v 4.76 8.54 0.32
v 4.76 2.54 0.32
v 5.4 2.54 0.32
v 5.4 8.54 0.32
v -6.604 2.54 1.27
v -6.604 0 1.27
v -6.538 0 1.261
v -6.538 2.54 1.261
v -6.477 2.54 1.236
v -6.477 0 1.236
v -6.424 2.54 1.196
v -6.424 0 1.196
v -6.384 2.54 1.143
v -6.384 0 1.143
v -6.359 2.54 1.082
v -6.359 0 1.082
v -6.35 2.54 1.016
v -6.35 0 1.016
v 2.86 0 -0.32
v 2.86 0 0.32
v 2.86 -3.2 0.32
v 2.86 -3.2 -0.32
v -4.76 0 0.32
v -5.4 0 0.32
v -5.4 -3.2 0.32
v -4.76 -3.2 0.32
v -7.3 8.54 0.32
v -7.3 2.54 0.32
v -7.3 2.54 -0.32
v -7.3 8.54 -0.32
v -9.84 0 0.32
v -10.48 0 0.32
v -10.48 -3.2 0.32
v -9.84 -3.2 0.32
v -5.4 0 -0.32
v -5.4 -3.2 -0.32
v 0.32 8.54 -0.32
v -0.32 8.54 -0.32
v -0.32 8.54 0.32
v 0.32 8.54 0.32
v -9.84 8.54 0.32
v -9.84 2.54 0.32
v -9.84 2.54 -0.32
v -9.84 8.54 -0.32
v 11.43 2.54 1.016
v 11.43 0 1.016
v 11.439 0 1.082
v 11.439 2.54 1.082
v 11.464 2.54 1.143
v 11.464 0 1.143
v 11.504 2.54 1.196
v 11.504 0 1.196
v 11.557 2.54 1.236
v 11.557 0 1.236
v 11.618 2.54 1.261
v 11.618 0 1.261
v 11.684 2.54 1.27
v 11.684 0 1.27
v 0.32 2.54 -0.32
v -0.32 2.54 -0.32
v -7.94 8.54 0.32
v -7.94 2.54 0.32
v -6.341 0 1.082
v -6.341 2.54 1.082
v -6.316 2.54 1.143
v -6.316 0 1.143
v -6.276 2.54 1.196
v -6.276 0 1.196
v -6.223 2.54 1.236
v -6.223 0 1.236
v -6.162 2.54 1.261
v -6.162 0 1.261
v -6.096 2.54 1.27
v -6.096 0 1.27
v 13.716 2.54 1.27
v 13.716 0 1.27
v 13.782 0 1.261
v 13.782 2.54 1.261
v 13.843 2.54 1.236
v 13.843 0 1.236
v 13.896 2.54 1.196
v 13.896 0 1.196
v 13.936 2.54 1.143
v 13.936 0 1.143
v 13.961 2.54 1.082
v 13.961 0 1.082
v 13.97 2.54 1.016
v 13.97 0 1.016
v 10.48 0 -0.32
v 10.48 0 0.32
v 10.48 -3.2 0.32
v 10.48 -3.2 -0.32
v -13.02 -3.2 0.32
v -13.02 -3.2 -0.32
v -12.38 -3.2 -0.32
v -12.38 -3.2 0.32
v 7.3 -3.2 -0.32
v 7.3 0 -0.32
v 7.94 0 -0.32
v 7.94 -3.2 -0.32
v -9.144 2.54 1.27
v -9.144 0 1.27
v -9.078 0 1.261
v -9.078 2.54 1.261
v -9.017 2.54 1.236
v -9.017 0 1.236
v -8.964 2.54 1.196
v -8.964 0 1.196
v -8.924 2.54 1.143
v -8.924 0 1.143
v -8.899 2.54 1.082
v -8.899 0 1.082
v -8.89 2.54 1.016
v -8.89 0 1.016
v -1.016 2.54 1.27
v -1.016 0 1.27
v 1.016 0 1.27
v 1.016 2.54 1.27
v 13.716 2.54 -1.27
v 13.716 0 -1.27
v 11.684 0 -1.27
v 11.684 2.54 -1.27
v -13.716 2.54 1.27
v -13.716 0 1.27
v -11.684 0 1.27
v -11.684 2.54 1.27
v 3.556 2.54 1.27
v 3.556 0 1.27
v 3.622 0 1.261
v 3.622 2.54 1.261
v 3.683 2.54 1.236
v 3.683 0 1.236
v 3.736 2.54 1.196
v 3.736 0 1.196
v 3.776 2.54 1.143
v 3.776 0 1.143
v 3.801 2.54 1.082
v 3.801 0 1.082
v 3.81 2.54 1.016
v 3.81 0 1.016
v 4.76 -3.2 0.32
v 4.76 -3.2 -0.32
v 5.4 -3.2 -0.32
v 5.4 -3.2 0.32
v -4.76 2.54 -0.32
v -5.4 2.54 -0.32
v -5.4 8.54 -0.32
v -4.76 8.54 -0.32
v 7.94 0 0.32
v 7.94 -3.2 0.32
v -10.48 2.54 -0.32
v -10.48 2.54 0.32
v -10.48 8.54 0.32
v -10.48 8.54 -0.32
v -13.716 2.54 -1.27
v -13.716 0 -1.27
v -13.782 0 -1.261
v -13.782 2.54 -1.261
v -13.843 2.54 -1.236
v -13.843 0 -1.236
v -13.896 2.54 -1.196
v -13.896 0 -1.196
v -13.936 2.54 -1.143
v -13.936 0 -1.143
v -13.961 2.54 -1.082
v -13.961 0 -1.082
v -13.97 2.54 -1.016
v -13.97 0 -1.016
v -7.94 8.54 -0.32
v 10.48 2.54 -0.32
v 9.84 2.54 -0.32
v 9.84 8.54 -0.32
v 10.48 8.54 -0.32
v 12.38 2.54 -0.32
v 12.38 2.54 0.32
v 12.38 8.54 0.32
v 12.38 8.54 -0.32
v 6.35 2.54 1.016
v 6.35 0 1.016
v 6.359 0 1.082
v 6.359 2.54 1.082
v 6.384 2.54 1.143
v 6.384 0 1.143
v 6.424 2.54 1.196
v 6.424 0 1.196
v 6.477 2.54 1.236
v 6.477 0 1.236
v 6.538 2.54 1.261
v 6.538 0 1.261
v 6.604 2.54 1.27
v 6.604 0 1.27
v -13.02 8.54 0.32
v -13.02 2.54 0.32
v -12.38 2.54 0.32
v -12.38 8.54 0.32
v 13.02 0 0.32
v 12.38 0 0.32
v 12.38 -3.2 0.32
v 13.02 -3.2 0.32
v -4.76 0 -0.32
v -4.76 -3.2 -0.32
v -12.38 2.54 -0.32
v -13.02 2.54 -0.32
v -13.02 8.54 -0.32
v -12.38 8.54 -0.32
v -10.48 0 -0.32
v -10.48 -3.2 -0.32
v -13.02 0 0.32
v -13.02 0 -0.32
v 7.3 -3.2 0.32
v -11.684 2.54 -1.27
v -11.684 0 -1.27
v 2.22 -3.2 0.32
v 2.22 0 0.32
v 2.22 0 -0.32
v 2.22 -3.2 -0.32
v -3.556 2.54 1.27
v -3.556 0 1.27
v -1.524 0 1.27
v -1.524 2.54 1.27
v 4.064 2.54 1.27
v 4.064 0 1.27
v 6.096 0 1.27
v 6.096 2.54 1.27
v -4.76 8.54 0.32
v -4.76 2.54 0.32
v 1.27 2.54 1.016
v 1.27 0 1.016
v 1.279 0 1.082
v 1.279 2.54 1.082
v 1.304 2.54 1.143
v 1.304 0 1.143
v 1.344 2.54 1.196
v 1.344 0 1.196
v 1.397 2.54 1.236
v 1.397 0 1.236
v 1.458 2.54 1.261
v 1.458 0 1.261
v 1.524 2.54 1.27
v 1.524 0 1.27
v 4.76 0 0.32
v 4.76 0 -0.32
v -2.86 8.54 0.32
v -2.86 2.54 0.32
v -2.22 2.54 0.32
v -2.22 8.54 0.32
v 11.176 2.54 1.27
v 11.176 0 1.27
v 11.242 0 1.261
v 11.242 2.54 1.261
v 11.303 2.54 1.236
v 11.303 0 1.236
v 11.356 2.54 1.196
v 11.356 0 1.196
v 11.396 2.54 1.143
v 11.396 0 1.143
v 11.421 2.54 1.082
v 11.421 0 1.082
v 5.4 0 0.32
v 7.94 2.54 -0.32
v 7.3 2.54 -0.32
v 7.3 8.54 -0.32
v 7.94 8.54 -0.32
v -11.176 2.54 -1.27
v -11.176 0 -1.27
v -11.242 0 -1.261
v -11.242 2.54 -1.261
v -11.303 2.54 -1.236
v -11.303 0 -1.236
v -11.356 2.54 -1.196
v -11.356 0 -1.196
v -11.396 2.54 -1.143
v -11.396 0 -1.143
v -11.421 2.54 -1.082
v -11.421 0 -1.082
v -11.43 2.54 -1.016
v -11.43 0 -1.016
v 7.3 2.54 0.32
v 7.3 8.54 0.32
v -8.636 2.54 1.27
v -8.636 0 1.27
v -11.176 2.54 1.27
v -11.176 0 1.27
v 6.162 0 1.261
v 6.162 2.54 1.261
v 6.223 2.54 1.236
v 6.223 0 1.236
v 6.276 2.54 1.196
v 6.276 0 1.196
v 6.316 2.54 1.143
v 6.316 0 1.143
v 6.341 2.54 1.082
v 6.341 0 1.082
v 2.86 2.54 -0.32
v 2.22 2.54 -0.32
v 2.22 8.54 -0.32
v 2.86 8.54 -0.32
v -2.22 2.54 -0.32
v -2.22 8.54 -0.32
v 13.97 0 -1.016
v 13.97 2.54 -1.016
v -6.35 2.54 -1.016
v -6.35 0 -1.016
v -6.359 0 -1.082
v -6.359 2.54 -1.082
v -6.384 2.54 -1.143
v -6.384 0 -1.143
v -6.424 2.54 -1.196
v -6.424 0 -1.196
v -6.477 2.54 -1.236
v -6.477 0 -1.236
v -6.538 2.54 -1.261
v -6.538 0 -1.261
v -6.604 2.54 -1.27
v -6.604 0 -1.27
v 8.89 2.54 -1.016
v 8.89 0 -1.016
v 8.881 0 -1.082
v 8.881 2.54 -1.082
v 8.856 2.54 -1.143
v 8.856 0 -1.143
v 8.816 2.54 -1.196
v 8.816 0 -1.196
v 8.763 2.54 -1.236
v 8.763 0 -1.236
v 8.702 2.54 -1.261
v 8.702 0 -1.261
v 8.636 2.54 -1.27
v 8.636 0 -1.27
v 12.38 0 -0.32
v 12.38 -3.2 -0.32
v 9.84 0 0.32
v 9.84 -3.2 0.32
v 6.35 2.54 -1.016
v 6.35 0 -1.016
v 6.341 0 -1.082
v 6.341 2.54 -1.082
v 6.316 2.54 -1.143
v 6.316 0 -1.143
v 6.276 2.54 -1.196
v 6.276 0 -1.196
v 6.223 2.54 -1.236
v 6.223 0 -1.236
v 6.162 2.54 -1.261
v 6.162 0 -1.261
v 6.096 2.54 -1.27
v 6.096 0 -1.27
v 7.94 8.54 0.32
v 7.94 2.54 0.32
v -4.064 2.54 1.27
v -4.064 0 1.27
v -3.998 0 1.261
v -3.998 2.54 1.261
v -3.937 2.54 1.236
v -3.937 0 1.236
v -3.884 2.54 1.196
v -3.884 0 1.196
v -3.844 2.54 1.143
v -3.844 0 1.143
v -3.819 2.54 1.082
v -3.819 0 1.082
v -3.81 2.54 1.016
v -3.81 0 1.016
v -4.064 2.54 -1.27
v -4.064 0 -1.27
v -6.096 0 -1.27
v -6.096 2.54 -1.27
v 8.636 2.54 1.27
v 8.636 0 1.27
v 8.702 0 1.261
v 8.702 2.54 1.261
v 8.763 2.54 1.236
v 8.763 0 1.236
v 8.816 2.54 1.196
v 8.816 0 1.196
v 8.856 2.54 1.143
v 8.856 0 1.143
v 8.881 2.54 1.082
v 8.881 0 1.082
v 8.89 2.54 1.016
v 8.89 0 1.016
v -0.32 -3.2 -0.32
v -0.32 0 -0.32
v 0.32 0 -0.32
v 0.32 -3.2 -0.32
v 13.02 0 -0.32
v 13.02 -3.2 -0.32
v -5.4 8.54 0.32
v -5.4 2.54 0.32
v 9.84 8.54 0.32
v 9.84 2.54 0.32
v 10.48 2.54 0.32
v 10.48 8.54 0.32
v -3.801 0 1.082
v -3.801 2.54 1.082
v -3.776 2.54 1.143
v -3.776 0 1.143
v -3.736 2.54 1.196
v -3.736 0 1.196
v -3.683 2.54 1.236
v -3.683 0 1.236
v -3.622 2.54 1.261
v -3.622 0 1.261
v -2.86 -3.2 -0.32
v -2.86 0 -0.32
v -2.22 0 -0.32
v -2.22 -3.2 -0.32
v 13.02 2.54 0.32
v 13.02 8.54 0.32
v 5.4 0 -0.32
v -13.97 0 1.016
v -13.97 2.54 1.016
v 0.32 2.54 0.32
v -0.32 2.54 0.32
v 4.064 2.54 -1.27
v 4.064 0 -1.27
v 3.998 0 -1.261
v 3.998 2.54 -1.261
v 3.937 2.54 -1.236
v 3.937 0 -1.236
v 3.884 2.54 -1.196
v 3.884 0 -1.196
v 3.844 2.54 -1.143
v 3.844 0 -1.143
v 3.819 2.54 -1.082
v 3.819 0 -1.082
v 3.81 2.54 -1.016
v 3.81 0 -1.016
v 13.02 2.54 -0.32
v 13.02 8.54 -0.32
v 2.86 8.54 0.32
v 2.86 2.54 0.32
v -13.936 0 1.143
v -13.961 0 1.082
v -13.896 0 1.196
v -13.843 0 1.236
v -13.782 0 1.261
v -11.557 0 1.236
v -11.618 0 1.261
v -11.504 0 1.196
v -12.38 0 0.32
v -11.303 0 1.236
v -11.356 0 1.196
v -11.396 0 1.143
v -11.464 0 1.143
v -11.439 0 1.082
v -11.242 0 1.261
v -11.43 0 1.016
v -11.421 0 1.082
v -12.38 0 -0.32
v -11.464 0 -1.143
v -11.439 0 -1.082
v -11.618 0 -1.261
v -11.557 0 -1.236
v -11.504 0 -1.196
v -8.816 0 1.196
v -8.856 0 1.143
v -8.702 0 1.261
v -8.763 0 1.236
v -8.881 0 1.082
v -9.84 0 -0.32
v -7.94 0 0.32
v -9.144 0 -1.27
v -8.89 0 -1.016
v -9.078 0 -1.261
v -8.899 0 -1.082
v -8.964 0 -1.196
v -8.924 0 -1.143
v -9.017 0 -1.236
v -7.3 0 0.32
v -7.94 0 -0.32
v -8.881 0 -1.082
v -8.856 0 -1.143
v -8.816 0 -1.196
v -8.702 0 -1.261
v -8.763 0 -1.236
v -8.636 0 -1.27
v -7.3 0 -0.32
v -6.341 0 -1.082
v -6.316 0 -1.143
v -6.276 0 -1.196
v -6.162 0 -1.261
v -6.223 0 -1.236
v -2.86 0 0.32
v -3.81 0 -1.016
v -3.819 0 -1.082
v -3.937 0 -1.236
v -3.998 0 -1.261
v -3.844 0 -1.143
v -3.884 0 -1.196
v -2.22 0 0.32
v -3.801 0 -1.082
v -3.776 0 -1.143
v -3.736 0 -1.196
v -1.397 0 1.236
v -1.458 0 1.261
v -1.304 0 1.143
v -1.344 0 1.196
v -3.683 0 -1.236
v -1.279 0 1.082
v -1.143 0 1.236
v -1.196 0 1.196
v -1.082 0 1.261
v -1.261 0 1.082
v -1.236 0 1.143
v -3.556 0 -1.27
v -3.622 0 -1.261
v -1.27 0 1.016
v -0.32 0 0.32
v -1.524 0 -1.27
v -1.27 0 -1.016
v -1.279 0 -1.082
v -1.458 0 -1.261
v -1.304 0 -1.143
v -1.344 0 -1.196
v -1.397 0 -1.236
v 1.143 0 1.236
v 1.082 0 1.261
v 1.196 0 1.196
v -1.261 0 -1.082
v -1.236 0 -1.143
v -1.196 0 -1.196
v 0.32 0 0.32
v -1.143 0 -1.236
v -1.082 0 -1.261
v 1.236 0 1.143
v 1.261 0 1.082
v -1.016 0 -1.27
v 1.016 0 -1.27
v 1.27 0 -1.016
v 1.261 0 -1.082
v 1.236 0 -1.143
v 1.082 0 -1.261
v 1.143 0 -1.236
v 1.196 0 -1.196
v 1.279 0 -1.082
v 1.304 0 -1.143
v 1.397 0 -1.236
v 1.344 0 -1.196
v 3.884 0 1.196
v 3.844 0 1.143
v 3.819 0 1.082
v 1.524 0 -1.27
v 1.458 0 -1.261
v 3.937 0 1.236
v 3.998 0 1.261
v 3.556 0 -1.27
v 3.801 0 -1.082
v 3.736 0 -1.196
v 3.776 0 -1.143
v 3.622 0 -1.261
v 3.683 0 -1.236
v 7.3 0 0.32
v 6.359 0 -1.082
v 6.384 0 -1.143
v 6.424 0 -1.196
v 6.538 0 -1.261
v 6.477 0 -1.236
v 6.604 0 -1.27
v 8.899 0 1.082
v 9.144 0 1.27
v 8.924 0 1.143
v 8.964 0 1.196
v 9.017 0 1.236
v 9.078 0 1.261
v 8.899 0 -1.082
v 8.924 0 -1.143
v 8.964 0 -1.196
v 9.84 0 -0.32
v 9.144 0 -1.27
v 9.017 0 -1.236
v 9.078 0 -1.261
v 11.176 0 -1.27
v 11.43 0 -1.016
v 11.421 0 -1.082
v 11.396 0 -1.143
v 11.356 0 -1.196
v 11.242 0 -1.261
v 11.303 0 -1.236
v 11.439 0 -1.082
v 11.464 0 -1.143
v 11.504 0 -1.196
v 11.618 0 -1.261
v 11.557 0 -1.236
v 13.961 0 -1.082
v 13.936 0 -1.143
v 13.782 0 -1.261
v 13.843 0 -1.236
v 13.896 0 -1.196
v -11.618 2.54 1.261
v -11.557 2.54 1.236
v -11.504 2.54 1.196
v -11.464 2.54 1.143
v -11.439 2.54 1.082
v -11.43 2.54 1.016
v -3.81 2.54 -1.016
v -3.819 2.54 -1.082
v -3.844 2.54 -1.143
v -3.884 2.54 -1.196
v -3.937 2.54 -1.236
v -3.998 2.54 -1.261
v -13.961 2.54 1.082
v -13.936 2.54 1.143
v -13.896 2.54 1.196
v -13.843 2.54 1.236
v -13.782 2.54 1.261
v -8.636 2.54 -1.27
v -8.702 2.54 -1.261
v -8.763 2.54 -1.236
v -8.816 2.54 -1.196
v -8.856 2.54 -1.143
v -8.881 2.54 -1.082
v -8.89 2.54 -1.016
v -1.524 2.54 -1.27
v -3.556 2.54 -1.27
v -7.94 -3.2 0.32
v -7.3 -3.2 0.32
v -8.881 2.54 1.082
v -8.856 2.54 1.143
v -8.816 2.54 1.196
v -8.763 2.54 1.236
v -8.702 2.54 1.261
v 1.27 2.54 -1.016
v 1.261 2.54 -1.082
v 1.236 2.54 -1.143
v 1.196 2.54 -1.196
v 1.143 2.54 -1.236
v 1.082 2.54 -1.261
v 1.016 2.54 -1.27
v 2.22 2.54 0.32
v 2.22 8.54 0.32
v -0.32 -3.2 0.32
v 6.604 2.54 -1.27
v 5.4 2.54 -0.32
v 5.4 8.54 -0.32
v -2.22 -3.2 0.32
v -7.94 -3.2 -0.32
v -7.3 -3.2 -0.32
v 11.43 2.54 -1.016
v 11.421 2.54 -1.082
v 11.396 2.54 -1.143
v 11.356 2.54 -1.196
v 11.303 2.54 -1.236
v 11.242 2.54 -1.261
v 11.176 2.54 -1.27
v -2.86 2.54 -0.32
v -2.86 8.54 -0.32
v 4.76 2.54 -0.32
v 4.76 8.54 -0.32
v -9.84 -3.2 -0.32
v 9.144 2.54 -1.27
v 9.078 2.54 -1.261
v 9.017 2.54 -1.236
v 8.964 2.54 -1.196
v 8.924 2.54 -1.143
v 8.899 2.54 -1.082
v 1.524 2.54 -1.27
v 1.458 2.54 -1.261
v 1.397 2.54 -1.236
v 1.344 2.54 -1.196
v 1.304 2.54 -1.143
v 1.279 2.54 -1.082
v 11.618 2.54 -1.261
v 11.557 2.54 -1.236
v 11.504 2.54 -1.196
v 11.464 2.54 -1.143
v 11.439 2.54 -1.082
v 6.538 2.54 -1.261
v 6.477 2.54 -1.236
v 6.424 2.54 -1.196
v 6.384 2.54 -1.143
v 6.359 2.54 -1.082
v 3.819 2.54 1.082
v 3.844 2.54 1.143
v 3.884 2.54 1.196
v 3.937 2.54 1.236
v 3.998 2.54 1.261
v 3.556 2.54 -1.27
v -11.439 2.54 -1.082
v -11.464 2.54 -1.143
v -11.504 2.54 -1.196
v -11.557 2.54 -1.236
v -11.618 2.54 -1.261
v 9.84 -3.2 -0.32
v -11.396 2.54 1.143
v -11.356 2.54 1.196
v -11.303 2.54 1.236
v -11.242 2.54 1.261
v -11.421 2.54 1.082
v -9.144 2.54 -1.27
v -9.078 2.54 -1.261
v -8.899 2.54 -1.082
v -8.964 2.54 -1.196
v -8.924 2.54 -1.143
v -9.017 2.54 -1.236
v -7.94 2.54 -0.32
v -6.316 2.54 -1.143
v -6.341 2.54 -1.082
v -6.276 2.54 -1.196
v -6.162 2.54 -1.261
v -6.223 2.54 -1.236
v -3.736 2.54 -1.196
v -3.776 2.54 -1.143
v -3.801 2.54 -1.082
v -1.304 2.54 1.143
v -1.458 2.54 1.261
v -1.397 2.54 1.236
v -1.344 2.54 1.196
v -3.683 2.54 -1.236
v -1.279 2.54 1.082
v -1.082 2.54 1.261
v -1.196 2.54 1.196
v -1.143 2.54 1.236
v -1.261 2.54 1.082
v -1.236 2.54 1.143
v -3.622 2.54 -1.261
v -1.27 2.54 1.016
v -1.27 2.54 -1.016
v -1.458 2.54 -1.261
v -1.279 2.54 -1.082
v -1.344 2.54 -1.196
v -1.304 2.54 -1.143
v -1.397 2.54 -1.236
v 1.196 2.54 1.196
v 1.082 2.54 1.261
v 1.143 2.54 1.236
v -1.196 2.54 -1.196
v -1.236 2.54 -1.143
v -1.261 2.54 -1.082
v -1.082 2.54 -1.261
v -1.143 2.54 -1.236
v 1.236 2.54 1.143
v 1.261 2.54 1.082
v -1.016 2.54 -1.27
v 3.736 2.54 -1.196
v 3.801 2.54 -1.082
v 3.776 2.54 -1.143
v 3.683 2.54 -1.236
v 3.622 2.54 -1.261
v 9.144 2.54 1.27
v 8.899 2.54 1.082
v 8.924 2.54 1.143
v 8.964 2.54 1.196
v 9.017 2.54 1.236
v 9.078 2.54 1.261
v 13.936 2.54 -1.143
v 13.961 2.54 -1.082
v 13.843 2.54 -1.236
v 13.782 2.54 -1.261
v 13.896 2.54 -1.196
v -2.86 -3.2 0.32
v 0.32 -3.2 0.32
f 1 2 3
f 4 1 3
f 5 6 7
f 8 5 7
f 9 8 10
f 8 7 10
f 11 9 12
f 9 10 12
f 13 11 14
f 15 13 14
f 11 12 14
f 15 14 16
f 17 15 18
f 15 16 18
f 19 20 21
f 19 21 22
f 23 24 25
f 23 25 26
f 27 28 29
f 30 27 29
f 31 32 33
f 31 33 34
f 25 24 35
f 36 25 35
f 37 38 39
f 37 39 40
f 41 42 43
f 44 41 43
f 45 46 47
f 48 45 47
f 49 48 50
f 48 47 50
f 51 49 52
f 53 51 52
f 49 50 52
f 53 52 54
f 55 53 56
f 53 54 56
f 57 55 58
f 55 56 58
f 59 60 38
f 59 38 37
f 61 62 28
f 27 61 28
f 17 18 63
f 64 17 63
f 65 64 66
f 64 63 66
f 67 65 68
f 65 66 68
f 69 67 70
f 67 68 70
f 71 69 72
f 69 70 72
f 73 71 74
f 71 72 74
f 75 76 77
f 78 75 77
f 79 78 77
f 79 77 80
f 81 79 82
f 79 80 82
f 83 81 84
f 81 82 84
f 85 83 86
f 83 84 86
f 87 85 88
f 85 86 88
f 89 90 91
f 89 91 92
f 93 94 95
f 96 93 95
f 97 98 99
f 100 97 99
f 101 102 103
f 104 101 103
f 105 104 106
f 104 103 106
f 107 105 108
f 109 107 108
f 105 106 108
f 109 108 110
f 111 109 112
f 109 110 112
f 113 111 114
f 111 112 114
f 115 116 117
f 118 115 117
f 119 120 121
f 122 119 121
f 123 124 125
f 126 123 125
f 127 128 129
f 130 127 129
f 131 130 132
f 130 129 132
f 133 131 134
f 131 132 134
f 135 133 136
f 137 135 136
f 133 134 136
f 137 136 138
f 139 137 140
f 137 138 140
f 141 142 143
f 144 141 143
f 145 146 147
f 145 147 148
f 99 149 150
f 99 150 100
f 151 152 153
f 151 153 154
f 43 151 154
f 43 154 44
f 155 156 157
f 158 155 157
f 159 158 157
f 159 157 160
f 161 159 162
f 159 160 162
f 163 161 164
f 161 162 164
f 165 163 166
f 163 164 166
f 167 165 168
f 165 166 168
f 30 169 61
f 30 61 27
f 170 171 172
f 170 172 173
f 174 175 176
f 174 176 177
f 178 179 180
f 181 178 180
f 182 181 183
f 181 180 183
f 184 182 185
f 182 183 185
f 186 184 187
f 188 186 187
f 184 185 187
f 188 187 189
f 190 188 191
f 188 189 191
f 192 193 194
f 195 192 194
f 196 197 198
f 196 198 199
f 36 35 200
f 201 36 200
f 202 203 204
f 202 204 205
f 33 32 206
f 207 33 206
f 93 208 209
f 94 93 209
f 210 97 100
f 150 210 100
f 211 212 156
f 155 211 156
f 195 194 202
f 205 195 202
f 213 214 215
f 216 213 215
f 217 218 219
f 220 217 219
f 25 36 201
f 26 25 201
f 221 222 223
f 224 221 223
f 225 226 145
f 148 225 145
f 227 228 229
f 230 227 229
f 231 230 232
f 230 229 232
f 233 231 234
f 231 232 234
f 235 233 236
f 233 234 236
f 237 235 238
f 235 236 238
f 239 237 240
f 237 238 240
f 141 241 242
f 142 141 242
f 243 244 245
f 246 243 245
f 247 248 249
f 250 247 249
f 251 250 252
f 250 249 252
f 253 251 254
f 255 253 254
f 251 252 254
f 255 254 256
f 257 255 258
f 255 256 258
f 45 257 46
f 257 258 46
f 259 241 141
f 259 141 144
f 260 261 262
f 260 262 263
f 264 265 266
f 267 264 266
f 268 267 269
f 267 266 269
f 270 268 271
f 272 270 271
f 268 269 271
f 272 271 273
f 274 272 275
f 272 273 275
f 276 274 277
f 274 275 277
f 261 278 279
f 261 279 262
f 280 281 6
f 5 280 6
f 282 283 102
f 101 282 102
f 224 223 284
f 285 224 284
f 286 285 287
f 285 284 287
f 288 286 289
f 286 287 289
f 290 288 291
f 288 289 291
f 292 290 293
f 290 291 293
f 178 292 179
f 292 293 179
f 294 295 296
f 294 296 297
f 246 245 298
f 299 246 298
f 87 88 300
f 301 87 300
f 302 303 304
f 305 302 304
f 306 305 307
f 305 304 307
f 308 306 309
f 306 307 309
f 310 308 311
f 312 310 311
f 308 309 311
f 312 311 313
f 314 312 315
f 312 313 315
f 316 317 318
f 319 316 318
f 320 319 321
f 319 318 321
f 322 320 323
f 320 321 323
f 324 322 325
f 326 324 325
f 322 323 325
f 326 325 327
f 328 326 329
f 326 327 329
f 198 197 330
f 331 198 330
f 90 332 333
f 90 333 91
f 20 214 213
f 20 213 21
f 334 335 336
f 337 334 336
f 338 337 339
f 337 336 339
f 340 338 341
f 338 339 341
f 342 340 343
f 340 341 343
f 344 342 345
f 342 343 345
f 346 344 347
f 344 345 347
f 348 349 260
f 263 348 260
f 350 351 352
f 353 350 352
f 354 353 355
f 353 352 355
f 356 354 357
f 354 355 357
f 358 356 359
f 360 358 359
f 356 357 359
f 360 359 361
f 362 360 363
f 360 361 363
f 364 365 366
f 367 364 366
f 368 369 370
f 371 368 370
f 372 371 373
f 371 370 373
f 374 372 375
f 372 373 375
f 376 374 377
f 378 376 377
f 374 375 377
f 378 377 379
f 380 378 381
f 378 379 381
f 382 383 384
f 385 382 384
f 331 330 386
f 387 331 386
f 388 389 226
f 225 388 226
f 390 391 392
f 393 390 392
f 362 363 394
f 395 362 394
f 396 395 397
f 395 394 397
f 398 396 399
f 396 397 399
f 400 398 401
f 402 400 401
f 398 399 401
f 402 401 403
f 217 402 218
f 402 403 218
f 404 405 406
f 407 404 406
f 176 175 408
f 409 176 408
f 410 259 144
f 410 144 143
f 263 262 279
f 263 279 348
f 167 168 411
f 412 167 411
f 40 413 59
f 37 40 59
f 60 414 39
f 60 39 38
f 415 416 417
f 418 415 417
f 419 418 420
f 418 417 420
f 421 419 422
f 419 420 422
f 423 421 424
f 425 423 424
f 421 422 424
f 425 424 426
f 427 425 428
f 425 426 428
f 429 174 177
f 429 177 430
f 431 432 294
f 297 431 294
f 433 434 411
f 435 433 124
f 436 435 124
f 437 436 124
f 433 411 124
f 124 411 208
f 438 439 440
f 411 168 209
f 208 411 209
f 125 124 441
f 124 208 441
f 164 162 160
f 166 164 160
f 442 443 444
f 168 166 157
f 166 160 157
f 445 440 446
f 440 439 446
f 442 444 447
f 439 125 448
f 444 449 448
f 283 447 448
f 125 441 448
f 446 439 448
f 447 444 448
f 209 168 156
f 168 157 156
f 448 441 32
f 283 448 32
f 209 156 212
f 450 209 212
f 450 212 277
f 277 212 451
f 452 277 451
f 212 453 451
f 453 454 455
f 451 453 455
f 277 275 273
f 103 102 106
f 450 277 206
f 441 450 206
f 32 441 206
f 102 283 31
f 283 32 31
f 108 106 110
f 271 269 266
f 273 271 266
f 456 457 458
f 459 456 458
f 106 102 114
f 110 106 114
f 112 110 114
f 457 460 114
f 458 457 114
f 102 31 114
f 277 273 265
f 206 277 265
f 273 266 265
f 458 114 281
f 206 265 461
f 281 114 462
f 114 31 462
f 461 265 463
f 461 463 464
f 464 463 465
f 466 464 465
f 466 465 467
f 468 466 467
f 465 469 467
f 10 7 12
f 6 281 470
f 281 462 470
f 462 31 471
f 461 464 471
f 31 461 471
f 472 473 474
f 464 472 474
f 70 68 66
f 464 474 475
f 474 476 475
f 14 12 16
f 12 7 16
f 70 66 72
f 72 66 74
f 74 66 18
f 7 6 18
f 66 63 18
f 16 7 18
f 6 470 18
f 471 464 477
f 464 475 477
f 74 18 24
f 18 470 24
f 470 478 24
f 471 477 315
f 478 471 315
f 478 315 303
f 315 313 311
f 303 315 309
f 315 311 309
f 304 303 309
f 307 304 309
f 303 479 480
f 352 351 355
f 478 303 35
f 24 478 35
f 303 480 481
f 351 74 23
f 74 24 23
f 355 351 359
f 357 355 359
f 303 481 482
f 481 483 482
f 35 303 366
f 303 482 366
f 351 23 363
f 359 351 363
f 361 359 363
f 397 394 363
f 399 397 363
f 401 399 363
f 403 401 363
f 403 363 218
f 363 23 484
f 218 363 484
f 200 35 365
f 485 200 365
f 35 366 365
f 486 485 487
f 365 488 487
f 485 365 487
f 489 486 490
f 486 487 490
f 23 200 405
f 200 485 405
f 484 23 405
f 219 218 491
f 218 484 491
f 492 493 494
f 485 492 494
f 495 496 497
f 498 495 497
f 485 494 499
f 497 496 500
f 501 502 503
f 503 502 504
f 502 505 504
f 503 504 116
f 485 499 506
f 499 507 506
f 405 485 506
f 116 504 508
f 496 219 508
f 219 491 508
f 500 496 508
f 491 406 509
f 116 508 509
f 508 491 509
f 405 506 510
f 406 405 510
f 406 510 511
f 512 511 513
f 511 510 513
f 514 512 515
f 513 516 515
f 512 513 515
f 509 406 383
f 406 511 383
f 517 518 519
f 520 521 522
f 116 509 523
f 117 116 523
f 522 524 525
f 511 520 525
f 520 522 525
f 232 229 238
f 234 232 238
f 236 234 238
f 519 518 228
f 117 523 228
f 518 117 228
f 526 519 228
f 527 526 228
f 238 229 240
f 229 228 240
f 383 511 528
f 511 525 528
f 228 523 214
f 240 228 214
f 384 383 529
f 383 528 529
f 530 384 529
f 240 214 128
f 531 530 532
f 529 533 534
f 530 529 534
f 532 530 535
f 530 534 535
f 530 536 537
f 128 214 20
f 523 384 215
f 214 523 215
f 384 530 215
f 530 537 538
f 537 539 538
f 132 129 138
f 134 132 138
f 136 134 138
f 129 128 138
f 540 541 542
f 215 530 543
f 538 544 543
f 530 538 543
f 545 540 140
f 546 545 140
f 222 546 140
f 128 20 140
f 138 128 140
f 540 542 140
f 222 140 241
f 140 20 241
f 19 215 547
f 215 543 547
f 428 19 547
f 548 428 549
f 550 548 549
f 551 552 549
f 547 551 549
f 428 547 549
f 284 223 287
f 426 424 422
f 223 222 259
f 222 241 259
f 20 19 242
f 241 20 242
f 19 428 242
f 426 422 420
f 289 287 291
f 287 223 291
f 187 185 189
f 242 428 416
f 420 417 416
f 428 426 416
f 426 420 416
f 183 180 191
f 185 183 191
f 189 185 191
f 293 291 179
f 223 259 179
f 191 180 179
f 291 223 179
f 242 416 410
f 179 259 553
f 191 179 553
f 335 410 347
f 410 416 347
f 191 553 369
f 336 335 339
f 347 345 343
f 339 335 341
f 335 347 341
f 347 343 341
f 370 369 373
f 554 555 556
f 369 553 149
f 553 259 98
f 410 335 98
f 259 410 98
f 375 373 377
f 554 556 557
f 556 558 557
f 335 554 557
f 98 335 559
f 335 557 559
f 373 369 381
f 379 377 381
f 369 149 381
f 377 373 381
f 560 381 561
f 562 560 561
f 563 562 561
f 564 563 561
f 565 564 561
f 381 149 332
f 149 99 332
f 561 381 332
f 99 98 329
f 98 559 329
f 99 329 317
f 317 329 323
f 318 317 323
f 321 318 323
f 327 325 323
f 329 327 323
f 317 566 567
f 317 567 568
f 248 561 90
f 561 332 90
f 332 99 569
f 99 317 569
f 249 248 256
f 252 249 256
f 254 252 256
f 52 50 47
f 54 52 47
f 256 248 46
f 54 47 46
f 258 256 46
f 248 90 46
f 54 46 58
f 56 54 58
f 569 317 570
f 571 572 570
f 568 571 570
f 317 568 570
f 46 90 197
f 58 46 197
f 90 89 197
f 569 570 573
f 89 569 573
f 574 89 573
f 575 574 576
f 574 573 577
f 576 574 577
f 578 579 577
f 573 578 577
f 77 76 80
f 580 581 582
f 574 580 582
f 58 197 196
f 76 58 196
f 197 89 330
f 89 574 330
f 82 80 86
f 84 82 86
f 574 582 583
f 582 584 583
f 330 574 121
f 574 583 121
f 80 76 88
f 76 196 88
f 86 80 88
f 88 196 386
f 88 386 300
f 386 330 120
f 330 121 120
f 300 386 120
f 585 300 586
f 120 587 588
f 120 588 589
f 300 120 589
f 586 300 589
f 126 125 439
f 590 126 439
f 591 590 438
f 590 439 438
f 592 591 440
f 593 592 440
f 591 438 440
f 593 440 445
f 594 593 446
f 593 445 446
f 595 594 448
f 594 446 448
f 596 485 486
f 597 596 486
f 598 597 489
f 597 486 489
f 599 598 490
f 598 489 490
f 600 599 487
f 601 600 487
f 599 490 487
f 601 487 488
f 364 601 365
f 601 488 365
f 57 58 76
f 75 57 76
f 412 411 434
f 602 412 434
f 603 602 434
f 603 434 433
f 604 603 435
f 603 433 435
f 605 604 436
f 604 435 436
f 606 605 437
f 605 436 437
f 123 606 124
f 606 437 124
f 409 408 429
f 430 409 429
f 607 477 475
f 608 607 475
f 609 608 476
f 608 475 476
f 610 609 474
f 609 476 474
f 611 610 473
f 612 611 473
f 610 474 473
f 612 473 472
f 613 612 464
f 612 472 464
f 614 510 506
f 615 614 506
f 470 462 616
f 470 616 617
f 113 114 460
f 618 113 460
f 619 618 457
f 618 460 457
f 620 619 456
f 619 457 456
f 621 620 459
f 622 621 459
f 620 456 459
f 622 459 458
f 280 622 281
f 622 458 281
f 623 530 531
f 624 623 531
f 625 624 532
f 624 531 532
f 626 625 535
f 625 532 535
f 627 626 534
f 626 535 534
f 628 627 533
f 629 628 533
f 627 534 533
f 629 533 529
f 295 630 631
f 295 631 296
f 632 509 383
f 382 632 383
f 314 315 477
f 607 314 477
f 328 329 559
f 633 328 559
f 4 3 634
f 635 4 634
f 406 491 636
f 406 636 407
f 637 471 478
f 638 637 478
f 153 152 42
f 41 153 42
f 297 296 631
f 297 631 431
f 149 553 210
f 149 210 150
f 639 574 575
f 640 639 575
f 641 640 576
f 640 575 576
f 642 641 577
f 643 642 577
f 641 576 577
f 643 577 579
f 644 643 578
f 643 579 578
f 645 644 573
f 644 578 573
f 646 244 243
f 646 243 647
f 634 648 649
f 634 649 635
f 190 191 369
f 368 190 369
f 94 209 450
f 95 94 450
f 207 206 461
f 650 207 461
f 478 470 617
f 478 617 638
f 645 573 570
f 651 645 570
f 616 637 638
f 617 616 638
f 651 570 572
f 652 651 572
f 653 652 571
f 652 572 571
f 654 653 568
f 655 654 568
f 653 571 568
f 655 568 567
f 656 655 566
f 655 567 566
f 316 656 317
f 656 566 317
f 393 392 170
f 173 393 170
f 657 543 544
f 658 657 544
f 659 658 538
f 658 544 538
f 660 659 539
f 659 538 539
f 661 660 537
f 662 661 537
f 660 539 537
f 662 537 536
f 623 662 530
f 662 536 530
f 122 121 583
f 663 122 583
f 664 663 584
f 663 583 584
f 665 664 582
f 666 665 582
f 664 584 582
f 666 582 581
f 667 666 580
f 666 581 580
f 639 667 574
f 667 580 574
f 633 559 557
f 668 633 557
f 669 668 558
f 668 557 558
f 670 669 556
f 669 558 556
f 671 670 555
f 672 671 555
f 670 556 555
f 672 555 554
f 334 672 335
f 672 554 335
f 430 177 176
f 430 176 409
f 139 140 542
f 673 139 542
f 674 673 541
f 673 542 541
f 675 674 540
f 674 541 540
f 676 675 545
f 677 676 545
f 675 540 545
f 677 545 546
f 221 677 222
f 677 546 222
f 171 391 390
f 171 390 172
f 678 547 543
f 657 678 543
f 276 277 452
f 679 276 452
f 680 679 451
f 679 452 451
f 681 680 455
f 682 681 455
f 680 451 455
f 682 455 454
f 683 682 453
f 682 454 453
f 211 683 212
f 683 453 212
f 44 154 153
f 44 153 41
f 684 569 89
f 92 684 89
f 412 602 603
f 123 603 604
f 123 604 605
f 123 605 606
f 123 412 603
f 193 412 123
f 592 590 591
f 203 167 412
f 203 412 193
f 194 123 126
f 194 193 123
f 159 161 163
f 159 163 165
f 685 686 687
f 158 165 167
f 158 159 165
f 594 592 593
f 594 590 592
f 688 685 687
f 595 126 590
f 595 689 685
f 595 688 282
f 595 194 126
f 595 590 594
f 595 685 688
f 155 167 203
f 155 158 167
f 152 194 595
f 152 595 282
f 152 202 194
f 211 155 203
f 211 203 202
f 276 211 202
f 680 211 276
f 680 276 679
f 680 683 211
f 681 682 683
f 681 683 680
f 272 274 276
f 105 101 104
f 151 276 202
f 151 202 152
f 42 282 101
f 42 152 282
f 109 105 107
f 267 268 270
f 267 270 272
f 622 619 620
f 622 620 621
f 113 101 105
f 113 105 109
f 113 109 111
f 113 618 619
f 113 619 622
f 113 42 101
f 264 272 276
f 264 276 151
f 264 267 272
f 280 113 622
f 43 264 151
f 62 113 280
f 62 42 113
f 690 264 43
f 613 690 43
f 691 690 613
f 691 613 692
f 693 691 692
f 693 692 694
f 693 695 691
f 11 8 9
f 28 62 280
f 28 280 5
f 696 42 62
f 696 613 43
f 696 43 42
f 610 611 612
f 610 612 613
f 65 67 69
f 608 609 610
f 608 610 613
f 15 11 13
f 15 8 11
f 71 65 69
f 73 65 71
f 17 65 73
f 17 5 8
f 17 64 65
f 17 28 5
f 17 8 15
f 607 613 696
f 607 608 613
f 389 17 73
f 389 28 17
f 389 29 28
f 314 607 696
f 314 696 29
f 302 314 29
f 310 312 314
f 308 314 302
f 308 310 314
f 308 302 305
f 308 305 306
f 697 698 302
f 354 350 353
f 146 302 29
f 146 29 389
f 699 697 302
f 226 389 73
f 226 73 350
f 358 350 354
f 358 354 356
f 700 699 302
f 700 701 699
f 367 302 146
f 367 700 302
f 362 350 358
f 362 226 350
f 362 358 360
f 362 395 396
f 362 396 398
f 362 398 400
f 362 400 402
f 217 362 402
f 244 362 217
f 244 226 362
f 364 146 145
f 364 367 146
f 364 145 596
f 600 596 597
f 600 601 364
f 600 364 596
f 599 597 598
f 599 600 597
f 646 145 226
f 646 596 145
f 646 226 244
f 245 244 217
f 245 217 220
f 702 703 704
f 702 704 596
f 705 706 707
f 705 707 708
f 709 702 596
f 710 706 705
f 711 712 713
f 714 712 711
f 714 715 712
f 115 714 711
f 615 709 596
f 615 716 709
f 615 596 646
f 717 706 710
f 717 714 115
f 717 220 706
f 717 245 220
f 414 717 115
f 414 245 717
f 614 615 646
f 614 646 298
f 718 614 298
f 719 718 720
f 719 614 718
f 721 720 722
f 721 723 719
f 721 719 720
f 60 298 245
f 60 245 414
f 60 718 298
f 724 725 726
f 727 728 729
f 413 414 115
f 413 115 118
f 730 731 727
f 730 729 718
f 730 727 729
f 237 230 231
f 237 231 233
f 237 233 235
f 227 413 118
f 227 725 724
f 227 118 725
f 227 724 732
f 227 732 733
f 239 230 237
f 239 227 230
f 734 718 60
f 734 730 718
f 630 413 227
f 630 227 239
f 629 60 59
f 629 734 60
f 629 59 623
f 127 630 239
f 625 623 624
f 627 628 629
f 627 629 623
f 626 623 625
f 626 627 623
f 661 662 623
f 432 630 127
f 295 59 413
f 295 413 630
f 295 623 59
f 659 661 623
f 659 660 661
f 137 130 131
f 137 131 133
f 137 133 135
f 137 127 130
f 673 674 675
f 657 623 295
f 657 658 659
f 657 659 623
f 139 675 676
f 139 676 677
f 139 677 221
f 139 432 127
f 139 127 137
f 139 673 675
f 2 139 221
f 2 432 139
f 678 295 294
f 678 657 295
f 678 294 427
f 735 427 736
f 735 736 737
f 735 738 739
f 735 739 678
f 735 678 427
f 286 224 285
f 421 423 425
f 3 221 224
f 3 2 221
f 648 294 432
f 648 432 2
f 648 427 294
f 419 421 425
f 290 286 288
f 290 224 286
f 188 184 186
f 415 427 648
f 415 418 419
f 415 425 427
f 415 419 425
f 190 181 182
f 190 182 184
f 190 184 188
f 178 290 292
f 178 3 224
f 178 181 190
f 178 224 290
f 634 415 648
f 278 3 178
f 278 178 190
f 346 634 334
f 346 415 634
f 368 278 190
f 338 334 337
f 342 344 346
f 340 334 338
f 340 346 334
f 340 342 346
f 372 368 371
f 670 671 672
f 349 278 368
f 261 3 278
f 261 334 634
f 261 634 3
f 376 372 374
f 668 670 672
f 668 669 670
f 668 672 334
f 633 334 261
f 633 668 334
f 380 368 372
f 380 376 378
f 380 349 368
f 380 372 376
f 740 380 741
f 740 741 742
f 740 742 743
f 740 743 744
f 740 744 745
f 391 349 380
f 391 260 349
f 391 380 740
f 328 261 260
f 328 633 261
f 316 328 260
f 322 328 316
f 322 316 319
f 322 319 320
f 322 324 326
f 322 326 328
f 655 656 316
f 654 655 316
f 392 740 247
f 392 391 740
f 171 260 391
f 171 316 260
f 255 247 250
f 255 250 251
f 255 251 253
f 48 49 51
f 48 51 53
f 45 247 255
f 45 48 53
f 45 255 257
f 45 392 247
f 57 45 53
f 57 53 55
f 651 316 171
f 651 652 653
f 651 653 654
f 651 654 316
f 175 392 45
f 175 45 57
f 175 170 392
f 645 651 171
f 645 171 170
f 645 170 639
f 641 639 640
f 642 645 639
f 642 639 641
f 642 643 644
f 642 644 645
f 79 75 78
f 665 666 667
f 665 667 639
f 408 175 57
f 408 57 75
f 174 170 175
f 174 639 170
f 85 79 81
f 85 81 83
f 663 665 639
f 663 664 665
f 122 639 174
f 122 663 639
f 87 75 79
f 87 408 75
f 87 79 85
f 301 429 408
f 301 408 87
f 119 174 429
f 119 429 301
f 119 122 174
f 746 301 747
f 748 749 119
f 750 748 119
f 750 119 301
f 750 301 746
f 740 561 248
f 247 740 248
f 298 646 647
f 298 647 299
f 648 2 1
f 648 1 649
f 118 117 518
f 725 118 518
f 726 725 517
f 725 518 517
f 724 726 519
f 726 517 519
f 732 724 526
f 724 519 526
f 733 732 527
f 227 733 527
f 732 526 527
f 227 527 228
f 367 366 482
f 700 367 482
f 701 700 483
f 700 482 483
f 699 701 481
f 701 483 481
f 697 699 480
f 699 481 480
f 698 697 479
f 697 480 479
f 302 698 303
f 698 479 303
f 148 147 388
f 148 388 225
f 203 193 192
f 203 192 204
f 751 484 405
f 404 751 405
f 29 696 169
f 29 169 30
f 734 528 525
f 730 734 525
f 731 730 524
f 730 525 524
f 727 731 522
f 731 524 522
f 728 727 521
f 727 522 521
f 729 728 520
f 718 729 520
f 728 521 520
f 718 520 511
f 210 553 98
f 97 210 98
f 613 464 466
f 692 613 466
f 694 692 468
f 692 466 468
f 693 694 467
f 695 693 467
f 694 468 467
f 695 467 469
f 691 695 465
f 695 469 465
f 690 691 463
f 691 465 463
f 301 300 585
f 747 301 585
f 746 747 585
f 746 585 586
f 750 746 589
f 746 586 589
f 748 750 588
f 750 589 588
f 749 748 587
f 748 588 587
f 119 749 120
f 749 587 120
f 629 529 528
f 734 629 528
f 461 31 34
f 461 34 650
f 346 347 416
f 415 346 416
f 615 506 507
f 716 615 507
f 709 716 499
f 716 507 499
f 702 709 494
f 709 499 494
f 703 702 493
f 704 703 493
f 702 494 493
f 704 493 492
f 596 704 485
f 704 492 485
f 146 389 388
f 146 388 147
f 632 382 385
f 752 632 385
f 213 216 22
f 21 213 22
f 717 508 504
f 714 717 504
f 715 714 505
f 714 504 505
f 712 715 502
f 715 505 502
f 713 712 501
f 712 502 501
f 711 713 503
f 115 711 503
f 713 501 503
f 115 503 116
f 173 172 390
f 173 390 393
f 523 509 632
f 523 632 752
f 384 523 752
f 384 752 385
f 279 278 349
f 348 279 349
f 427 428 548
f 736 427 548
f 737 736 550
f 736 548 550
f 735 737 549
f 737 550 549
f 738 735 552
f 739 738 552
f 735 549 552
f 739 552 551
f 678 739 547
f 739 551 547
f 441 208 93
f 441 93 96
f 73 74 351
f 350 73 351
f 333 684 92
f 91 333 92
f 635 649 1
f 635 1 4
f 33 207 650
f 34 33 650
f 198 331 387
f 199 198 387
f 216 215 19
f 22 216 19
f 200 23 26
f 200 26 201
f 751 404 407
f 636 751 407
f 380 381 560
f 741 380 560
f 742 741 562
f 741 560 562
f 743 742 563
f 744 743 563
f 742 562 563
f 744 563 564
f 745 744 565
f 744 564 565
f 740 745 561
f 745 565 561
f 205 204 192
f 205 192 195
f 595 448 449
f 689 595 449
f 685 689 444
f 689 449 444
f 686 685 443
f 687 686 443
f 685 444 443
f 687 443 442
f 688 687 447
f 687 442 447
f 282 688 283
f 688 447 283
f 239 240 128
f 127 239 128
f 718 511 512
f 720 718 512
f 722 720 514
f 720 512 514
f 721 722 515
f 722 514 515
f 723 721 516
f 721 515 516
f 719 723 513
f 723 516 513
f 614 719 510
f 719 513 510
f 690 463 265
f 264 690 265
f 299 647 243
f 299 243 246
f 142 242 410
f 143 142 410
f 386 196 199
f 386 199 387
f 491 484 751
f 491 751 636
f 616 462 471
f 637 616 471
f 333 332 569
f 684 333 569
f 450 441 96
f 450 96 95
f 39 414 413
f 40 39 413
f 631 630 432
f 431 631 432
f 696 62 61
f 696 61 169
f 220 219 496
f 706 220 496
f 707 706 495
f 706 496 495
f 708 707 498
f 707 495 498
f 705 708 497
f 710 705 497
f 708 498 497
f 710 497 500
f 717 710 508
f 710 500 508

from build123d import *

# Parameters (mm, degrees)
BOSS_EXTRUDE1_DEPTH      = 2.54
SKETCH2_W                = 0.64
SKETCH2_H                = 0.64
BOSS_EXTRUDE2_DEPTH      = 6
BOSS_EXTRUDE2_DEPTH_BACK = 5.74


with BuildPart() as part:
    # Sketch1 → Boss-Extrude1 (new body)
    with BuildSketch(Plane(origin=(0, 0, 0), x_dir=(1, 0, 0), z_dir=(0, 1, 0))):
        with BuildLine():
            Line((-11.43, -1.016), (-11.43, 1.016))
            ThreePointArc((-11.43, 1.016), (-11.504394878, 1.195605122), (-11.684, 1.27))
            Line((-11.684, 1.27), (-13.716, 1.27))
            ThreePointArc((-13.716, 1.27), (-13.895605122, 1.195605122), (-13.97, 1.016))
            Line((-13.97, 1.016), (-13.97, -1.016))
            ThreePointArc((-13.97, -1.016), (-13.895605122, -1.195605122), (-13.716, -1.27))
            Line((-13.716, -1.27), (-11.684, -1.27))
            ThreePointArc((-11.684, -1.27), (-11.504394878, -1.195605122), (-11.43, -1.016))
        make_face()
        with BuildLine():
            Line((-8.89, -1.016), (-8.89, 1.016))
            ThreePointArc((-8.89, 1.016), (-8.964394878, 1.195605122), (-9.144, 1.27))
            Line((-9.144, 1.27), (-11.176, 1.27))
            ThreePointArc((-11.176, 1.27), (-11.355605122, 1.195605122), (-11.43, 1.016))
            Line((-11.43, 1.016), (-11.43, -1.016))
            ThreePointArc((-11.43, -1.016), (-11.355605122, -1.195605122), (-11.176, -1.27))
            Line((-11.176, -1.27), (-9.144, -1.27))
            ThreePointArc((-9.144, -1.27), (-8.964394878, -1.195605122), (-8.89, -1.016))
        make_face()
        with BuildLine():
            Line((-6.35, -1.016), (-6.35, 1.016))
            ThreePointArc((-6.35, 1.016), (-6.424394878, 1.195605122), (-6.604, 1.27))
            Line((-6.604, 1.27), (-8.636, 1.27))
            ThreePointArc((-8.636, 1.27), (-8.815605122, 1.195605122), (-8.89, 1.016))
            Line((-8.89, 1.016), (-8.89, -1.016))
            ThreePointArc((-8.89, -1.016), (-8.815605122, -1.195605122), (-8.636, -1.27))
            Line((-8.636, -1.27), (-6.604, -1.27))
            ThreePointArc((-6.604, -1.27), (-6.424394878, -1.195605122), (-6.35, -1.016))
        make_face()
        with BuildLine():
            Line((-3.81, -1.016), (-3.81, 1.016))
            ThreePointArc((-3.81, 1.016), (-3.884394878, 1.195605122), (-4.064, 1.27))
            Line((-4.064, 1.27), (-6.096, 1.27))
            ThreePointArc((-6.096, 1.27), (-6.275605122, 1.195605122), (-6.35, 1.016))
            Line((-6.35, 1.016), (-6.35, -1.016))
            ThreePointArc((-6.35, -1.016), (-6.275605122, -1.195605122), (-6.096, -1.27))
            Line((-6.096, -1.27), (-4.064, -1.27))
            ThreePointArc((-4.064, -1.27), (-3.884394878, -1.195605122), (-3.81, -1.016))
        make_face()
        with BuildLine():
            Line((-1.27, -1.016), (-1.27, 1.016))
            ThreePointArc((-1.27, 1.016), (-1.344394878, 1.195605122), (-1.524, 1.27))
            Line((-1.524, 1.27), (-3.556, 1.27))
            ThreePointArc((-3.556, 1.27), (-3.735605122, 1.195605122), (-3.81, 1.016))
            Line((-3.81, 1.016), (-3.81, -1.016))
            ThreePointArc((-3.81, -1.016), (-3.735605122, -1.195605122), (-3.556, -1.27))
            Line((-3.556, -1.27), (-1.524, -1.27))
            ThreePointArc((-1.524, -1.27), (-1.344394878, -1.195605122), (-1.27, -1.016))
        make_face()
        with BuildLine():
            Line((1.27, -1.016), (1.27, 1.016))
            ThreePointArc((1.27, 1.016), (1.195605122, 1.195605122), (1.016, 1.27))
            Line((1.016, 1.27), (-1.016, 1.27))
            ThreePointArc((-1.016, 1.27), (-1.195605122, 1.195605122), (-1.27, 1.016))
            Line((-1.27, 1.016), (-1.27, -1.016))
            ThreePointArc((-1.27, -1.016), (-1.195605122, -1.195605122), (-1.016, -1.27))
            Line((-1.016, -1.27), (1.016, -1.27))
            ThreePointArc((1.016, -1.27), (1.195605122, -1.195605122), (1.27, -1.016))
        make_face()
        with BuildLine():
            Line((3.81, -1.016), (3.81, 1.016))
            ThreePointArc((3.81, 1.016), (3.735605122, 1.195605122), (3.556, 1.27))
            Line((3.556, 1.27), (1.524, 1.27))
            ThreePointArc((1.524, 1.27), (1.344394878, 1.195605122), (1.27, 1.016))
            Line((1.27, 1.016), (1.27, -1.016))
            ThreePointArc((1.27, -1.016), (1.344394878, -1.195605122), (1.524, -1.27))
            Line((1.524, -1.27), (3.556, -1.27))
            ThreePointArc((3.556, -1.27), (3.735605122, -1.195605122), (3.81, -1.016))
        make_face()
        with BuildLine():
            Line((6.35, -1.016), (6.35, 1.016))
            ThreePointArc((6.35, 1.016), (6.275605122, 1.195605122), (6.096, 1.27))
            Line((6.096, 1.27), (4.064, 1.27))
            ThreePointArc((4.064, 1.27), (3.884394878, 1.195605122), (3.81, 1.016))
            Line((3.81, 1.016), (3.81, -1.016))
            ThreePointArc((3.81, -1.016), (3.884394878, -1.195605122), (4.064, -1.27))
            Line((4.064, -1.27), (6.096, -1.27))
            ThreePointArc((6.096, -1.27), (6.275605122, -1.195605122), (6.35, -1.016))
        make_face()
        with BuildLine():
            Line((8.89, -1.016), (8.89, 1.016))
            ThreePointArc((8.89, 1.016), (8.815605122, 1.195605122), (8.636, 1.27))
            Line((8.636, 1.27), (6.604, 1.27))
            ThreePointArc((6.604, 1.27), (6.424394878, 1.195605122), (6.35, 1.016))
            Line((6.35, 1.016), (6.35, -1.016))
            ThreePointArc((6.35, -1.016), (6.424394878, -1.195605122), (6.604, -1.27))
            Line((6.604, -1.27), (8.636, -1.27))
            ThreePointArc((8.636, -1.27), (8.815605122, -1.195605122), (8.89, -1.016))
        make_face()
        with BuildLine():
            Line((11.43, -1.016), (11.43, 1.016))
            ThreePointArc((11.43, 1.016), (11.355605122, 1.195605122), (11.176, 1.27))
            Line((11.176, 1.27), (9.144, 1.27))
            ThreePointArc((9.144, 1.27), (8.964394878, 1.195605122), (8.89, 1.016))
            Line((8.89, 1.016), (8.89, -1.016))
            ThreePointArc((8.89, -1.016), (8.964394878, -1.195605122), (9.144, -1.27))
            Line((9.144, -1.27), (11.176, -1.27))
            ThreePointArc((11.176, -1.27), (11.355605122, -1.195605122), (11.43, -1.016))
        make_face()
        with BuildLine():
            Line((13.97, -1.016), (13.97, 1.016))
            ThreePointArc((13.97, 1.016), (13.895605122, 1.195605122), (13.716, 1.27))
            Line((13.716, 1.27), (11.684, 1.27))
            ThreePointArc((11.684, 1.27), (11.504394878, 1.195605122), (11.43, 1.016))
            Line((11.43, 1.016), (11.43, -1.016))
            ThreePointArc((11.43, -1.016), (11.504394878, -1.195605122), (11.684, -1.27))
            Line((11.684, -1.27), (13.716, -1.27))
            ThreePointArc((13.716, -1.27), (13.895605122, -1.195605122), (13.97, -1.016))
        make_face()
    extrude(amount=BOSS_EXTRUDE1_DEPTH)

    # Sketch2 → Boss-Extrude2 (add, two sides)
    with BuildSketch(Plane(origin=(0, 2.54, 0), x_dir=(1, 0, 0), z_dir=(0, 1, 0))) as boss_extrude2_sk:
        with Locations((-12.7, 0)):
            Rectangle(SKETCH2_W, SKETCH2_H)
        with Locations((-10.16, 0)):
            Rectangle(SKETCH2_W, SKETCH2_H)
        with Locations((-7.62, 0)):
            Rectangle(SKETCH2_W, SKETCH2_H)
        with Locations((-5.08, 0)):
            Rectangle(SKETCH2_W, SKETCH2_H)
        with Locations((-2.54, 0)):
            Rectangle(SKETCH2_W, SKETCH2_H)
        Rectangle(SKETCH2_W, SKETCH2_H)
        with Locations((2.54, 0)):
            Rectangle(SKETCH2_W, SKETCH2_H)
        with Locations((5.08, 0)):
            Rectangle(SKETCH2_W, SKETCH2_H)
        with Locations((7.62, 0)):
            Rectangle(SKETCH2_W, SKETCH2_H)
        with Locations((10.16, 0)):
            Rectangle(SKETCH2_W, SKETCH2_H)
        with Locations((12.7, 0)):
            Rectangle(SKETCH2_W, SKETCH2_H)
    extrude(amount=BOSS_EXTRUDE2_DEPTH)
    extrude(boss_extrude2_sk.sketch, amount=-BOSS_EXTRUDE2_DEPTH_BACK)


solid = part.part
